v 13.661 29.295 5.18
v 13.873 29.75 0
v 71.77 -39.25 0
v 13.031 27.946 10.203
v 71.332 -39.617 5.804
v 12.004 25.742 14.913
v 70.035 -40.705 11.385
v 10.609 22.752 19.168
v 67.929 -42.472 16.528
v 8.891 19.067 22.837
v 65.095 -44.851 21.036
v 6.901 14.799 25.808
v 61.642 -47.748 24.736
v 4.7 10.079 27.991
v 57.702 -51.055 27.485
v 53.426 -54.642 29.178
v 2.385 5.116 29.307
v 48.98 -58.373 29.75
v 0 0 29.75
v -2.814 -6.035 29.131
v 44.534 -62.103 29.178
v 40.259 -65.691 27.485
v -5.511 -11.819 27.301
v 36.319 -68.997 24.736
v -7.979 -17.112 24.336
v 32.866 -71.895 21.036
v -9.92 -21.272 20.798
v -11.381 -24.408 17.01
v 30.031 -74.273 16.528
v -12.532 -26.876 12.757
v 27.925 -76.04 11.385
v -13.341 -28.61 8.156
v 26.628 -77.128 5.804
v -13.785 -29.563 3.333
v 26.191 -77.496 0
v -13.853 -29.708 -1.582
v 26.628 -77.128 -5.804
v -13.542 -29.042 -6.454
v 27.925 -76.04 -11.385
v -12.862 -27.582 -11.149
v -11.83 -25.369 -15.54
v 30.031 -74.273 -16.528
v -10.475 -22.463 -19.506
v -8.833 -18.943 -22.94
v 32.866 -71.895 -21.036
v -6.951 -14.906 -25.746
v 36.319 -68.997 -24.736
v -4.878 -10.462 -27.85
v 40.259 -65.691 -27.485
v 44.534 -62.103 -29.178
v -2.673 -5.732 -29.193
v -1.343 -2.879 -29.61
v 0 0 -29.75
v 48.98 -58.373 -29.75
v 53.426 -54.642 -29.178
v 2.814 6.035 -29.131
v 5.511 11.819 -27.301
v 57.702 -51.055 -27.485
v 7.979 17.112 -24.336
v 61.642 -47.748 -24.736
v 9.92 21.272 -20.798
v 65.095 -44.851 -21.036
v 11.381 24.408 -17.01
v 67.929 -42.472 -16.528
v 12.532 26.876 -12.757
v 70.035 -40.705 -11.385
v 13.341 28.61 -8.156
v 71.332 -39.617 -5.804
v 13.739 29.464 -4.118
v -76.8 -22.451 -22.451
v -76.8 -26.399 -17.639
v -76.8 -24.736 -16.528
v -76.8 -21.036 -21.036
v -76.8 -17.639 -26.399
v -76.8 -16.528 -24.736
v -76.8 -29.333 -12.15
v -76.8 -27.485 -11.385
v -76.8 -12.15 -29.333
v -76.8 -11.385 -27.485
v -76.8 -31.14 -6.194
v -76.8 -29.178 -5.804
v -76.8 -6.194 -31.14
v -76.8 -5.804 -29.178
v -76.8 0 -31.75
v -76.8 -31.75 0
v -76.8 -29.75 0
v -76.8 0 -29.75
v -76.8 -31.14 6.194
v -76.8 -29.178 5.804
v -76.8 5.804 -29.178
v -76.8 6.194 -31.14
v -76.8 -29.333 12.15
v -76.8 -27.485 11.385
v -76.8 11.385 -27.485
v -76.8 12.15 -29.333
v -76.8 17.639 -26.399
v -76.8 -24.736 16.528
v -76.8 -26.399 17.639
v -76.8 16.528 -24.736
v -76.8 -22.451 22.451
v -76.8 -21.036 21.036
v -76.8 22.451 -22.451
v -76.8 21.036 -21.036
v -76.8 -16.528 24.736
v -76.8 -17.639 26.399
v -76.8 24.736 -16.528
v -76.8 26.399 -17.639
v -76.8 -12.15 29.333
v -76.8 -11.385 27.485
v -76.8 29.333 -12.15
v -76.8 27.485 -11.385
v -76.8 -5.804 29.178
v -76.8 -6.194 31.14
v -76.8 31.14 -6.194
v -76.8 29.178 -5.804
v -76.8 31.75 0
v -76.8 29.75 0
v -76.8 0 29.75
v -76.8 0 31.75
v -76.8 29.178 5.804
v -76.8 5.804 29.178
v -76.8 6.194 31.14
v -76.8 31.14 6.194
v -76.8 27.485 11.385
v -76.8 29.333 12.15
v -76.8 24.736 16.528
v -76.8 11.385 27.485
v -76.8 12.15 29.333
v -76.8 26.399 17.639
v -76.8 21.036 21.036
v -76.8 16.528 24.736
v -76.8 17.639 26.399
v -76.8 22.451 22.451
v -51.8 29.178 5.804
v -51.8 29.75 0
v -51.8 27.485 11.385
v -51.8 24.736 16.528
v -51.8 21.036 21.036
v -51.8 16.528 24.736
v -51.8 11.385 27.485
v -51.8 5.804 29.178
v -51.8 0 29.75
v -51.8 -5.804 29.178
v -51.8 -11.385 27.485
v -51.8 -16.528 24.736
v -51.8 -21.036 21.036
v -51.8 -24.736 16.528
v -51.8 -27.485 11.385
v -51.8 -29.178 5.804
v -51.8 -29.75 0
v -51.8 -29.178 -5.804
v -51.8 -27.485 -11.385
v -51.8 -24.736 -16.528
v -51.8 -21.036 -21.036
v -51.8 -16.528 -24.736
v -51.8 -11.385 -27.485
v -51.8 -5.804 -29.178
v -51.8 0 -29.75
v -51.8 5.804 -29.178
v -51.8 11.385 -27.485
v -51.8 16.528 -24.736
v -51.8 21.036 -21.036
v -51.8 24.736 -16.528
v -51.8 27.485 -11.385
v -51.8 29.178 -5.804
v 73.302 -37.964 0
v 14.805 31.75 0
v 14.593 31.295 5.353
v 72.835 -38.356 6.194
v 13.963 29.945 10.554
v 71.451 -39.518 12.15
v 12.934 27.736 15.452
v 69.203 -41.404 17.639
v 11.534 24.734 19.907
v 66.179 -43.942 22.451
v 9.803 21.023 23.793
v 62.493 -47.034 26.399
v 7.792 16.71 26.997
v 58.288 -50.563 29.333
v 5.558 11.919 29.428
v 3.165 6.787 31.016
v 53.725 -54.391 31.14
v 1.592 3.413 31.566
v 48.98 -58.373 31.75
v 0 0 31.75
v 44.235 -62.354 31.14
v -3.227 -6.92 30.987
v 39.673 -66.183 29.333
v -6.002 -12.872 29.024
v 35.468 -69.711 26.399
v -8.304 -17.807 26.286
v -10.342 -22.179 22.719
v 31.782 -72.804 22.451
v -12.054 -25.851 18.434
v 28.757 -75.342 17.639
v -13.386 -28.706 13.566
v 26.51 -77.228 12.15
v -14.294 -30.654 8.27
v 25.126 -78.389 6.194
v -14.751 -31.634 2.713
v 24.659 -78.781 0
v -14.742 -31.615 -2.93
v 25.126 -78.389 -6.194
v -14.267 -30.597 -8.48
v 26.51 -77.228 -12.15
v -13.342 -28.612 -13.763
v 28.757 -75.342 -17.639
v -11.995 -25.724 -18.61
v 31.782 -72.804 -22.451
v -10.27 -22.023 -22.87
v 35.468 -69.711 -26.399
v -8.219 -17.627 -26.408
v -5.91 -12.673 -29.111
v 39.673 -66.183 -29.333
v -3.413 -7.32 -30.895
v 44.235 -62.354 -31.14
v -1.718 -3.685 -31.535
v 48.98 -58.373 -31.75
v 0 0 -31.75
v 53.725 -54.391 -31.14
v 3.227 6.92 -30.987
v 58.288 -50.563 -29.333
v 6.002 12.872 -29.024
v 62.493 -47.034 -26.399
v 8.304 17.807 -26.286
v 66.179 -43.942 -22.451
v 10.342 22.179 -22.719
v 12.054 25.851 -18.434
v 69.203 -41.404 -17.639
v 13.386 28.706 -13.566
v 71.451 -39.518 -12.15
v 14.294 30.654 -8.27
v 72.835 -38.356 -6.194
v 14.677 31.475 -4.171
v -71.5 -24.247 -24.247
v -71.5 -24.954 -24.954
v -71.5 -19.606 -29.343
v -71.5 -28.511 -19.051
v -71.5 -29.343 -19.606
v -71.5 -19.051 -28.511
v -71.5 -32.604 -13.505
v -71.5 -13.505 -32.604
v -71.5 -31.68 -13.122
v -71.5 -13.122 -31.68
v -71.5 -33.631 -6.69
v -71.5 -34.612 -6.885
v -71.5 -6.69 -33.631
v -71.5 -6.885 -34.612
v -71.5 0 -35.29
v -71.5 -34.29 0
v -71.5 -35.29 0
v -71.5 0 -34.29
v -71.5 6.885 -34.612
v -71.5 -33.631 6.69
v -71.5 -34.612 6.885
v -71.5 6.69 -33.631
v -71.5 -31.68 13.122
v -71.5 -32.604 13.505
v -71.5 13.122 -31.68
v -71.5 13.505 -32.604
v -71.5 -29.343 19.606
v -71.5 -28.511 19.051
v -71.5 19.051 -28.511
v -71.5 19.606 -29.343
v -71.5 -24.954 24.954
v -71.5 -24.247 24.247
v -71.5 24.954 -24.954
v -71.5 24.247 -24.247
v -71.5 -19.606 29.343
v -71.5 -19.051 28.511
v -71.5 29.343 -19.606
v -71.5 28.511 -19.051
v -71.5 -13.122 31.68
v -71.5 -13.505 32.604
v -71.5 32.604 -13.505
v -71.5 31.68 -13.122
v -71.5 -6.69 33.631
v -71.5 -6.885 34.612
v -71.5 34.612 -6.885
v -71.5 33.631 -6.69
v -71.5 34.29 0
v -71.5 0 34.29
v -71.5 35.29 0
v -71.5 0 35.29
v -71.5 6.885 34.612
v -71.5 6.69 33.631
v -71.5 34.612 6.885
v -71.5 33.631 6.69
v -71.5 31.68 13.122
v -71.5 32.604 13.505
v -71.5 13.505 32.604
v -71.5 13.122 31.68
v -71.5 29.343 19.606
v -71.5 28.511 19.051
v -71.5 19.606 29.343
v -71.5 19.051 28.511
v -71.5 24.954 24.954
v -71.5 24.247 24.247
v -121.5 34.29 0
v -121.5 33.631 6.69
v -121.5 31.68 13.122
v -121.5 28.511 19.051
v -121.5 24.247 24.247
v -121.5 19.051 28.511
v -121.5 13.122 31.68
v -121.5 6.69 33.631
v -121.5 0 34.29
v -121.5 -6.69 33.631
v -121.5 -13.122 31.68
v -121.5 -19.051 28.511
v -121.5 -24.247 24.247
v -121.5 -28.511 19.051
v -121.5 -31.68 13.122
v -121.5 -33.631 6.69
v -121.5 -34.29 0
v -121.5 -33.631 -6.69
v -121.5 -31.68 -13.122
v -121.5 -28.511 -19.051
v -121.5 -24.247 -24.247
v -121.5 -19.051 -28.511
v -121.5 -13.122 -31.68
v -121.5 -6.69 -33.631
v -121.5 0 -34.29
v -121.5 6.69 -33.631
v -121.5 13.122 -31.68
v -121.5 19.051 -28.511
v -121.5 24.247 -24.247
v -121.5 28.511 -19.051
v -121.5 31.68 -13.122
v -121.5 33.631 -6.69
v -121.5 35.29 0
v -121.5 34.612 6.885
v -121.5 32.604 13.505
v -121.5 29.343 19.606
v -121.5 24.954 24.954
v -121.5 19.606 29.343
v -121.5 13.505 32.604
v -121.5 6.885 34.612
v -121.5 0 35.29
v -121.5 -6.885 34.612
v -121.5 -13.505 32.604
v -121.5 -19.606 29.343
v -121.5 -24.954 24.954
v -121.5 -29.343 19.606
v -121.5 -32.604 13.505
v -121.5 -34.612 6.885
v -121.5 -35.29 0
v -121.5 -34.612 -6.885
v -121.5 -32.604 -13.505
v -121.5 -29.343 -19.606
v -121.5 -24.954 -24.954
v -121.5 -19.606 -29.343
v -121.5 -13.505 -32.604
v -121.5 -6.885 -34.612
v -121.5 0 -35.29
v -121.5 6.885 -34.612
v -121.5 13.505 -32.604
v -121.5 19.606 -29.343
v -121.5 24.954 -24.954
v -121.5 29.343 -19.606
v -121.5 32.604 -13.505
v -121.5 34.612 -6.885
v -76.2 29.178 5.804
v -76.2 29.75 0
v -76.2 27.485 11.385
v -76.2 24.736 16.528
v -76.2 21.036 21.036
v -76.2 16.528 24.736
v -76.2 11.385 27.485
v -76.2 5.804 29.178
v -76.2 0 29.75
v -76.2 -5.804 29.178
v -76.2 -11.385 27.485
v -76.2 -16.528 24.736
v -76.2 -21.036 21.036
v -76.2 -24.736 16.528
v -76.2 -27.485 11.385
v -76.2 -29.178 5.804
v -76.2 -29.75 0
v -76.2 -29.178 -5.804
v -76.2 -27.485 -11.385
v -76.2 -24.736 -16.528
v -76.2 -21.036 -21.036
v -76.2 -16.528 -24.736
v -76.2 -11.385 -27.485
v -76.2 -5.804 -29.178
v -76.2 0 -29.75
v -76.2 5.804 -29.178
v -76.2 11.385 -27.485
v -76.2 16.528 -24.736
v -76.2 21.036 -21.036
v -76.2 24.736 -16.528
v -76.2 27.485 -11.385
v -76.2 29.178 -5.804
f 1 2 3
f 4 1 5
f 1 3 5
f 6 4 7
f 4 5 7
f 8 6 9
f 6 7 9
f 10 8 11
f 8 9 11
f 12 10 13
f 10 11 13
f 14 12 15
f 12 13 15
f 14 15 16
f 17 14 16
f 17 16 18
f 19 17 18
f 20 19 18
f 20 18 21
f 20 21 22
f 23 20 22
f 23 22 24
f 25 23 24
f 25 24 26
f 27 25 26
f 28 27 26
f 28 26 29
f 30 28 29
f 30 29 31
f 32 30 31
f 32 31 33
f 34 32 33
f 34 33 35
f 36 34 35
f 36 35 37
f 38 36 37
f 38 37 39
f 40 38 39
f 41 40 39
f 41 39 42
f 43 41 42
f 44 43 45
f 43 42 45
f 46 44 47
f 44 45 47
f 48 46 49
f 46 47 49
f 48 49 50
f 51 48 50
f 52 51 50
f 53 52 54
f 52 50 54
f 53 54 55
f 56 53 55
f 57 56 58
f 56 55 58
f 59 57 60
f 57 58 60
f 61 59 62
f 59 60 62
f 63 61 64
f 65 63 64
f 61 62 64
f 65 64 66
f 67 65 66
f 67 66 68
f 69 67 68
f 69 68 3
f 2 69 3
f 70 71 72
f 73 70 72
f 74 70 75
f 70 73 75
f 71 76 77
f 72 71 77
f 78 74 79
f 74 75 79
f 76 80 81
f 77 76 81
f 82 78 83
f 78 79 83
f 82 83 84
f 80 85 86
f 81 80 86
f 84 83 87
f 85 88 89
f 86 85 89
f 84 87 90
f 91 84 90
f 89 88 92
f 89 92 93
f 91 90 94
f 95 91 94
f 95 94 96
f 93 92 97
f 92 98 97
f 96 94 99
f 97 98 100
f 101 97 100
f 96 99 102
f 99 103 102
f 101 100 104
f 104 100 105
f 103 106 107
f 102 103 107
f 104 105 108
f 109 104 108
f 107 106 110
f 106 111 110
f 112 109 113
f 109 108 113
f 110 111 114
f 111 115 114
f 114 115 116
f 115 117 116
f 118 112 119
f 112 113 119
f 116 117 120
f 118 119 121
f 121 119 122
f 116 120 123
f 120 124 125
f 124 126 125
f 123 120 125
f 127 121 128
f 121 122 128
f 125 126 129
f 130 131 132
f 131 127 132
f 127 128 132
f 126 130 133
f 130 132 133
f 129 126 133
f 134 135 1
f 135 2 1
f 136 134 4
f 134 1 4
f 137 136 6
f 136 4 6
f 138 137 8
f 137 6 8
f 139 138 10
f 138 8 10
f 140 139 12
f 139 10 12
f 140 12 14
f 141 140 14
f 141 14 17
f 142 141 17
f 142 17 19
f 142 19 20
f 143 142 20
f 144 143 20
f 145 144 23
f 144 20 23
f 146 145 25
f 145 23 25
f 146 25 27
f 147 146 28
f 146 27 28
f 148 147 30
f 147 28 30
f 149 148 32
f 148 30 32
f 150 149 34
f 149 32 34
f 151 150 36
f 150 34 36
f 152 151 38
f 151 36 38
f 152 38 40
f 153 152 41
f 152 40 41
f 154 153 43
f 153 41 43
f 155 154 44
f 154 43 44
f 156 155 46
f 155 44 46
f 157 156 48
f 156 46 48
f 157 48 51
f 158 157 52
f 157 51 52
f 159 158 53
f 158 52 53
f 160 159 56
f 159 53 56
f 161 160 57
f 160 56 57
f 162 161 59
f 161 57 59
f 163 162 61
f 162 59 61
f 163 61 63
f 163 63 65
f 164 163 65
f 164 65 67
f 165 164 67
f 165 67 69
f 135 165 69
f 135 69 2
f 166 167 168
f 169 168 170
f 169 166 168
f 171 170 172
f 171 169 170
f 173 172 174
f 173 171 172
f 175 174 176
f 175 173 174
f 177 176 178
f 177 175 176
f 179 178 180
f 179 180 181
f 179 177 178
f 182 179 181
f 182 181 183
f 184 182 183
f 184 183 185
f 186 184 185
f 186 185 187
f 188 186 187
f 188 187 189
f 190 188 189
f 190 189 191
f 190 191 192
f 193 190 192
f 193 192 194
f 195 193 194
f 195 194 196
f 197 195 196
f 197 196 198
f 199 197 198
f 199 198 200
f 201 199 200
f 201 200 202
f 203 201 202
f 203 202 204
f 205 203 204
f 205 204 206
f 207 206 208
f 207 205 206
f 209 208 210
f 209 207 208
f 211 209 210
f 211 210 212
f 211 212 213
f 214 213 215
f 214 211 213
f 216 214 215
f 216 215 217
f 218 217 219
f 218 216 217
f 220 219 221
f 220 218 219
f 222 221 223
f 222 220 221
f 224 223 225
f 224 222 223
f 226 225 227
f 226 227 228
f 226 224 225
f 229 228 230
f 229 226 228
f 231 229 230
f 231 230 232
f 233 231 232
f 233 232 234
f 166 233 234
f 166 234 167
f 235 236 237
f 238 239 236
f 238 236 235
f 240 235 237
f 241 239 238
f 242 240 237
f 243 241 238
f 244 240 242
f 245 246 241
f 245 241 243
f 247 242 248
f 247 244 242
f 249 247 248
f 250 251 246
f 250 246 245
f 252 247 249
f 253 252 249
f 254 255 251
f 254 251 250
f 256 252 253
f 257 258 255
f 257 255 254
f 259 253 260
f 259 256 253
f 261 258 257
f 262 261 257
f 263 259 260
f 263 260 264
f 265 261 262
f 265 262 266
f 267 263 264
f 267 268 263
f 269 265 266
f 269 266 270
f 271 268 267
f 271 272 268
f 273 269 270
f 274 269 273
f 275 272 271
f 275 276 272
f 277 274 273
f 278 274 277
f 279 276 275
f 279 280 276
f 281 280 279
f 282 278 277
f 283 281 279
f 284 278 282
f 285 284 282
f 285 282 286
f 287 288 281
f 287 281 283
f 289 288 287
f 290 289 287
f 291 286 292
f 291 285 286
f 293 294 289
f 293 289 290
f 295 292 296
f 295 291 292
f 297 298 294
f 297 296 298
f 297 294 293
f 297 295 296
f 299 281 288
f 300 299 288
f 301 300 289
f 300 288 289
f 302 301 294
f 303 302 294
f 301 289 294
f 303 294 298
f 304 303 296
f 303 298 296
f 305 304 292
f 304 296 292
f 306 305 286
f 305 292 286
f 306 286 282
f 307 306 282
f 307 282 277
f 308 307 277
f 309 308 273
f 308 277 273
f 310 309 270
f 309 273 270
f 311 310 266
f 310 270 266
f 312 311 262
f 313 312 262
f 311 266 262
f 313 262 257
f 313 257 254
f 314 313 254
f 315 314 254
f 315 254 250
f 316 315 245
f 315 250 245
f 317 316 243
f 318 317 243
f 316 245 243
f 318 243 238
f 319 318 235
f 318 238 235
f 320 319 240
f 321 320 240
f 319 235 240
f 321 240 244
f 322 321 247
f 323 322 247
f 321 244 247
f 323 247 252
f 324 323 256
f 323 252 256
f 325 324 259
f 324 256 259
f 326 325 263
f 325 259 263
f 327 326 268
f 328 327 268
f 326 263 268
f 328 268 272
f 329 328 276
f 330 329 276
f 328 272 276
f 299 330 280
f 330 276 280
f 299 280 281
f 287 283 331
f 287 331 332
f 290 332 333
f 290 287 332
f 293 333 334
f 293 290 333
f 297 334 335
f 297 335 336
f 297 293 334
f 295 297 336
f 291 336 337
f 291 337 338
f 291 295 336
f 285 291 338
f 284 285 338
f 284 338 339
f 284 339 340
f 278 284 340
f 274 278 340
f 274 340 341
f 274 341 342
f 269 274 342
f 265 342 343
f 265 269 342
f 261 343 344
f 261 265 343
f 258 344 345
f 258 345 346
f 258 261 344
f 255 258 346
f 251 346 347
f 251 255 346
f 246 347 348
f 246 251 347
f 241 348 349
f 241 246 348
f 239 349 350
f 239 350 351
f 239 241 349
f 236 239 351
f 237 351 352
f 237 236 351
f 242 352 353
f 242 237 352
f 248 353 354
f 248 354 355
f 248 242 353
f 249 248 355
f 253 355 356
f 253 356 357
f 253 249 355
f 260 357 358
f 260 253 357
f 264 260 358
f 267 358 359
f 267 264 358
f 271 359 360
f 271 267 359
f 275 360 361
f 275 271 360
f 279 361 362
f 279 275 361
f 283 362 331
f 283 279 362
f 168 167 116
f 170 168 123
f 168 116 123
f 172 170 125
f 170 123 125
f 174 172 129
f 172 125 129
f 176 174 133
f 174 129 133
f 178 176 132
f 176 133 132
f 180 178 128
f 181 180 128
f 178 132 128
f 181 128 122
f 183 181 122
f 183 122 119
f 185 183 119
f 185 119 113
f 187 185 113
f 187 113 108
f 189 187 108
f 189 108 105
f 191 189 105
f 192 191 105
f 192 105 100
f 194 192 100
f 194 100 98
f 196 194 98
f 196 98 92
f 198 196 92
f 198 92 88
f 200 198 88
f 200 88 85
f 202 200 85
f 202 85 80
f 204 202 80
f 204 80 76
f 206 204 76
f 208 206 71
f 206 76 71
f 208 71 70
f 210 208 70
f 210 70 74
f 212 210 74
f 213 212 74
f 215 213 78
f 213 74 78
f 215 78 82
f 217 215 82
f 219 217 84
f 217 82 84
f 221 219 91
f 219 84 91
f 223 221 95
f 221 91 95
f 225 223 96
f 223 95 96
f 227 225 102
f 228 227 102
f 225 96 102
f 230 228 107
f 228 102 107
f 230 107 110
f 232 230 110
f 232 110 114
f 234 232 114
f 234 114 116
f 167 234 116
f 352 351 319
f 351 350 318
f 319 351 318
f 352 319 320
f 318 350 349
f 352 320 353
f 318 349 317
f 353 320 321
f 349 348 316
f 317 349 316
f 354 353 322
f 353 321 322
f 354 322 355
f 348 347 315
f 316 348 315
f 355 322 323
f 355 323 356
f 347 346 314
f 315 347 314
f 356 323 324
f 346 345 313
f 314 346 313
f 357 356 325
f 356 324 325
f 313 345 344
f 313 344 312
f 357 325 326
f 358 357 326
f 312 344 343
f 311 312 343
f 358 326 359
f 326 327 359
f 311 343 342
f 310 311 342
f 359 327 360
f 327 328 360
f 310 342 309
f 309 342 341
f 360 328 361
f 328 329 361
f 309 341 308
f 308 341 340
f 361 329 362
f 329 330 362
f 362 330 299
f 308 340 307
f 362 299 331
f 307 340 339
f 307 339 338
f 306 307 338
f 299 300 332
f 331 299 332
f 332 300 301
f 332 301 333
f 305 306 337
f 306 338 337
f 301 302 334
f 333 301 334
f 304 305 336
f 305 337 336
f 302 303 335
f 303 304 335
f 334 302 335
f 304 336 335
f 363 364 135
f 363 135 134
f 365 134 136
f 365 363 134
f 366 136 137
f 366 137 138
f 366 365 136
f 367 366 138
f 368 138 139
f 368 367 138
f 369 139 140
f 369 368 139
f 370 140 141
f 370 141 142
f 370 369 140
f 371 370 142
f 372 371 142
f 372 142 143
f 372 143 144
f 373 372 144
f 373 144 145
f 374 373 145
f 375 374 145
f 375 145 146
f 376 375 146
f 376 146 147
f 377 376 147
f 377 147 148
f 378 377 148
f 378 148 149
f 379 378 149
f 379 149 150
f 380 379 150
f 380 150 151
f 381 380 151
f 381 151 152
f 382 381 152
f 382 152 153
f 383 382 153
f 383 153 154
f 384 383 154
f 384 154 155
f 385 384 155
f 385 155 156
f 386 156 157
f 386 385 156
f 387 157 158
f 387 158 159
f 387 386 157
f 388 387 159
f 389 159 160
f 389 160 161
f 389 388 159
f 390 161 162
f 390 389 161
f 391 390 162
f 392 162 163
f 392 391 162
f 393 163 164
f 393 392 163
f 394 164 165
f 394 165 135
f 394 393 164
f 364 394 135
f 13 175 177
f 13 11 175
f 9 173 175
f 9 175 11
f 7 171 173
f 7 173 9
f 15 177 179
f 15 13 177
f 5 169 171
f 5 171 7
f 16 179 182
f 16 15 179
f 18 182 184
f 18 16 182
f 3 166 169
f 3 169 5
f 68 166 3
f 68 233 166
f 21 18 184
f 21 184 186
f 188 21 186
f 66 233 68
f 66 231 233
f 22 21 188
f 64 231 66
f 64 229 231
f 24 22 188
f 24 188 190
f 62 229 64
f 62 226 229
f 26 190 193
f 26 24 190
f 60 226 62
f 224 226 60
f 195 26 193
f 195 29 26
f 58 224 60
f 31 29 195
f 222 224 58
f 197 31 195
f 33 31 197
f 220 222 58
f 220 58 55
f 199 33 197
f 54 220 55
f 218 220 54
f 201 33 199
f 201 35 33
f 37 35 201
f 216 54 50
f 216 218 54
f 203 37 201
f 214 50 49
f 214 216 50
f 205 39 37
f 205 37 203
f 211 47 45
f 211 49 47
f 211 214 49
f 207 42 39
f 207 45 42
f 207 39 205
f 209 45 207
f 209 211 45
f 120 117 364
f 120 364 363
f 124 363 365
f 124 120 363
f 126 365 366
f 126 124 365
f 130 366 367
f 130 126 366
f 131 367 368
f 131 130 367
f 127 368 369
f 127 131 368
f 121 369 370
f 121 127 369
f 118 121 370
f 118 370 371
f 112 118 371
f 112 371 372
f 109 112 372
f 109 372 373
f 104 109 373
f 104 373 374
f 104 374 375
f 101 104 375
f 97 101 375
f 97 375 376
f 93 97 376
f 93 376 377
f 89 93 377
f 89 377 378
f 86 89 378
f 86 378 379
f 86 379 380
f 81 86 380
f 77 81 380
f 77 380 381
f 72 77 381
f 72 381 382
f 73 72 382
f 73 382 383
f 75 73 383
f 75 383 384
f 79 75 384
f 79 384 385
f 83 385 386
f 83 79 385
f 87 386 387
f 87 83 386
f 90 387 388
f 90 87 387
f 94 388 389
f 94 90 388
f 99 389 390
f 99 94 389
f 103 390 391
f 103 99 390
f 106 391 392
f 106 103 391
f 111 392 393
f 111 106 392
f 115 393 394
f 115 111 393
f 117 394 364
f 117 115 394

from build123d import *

# Parameters (mm, degrees)
F2_R        = 31.75
F2_R_2      = 29.7500006855
F3_DEPTH    = 25
F3_FACE_R   = 31.75
F3_FACE_R_2 = 29.7500006855
F6_R        = 35.2899990976
F6_R_2      = 34.29
F7_DEPTH    = 50


with BuildPart() as f3:
    # F2 (on offset) → F3 (new body)
    with BuildSketch(Plane.YZ.offset(-76.8)):
        Circle(F2_R)
        Circle(F2_R_2, mode=Mode.SUBTRACT)
    extrude(amount=F3_DEPTH)

    # F4: sweep along a path in F0
    with BuildLine(Plane.XY) as f4_path:
        Line((-76.2, 0), (0, 0))
        Line((0, 0), (48.9804158581, -58.3725865657))
    # F3_face (on face) → F4 (sweep)
    with BuildSketch(Plane.YZ.offset(-51.8)):
        Circle(F3_FACE_R)
        Circle(F3_FACE_R_2, mode=Mode.SUBTRACT)
    sweep(path=f4_path.line, transition=Transition.RIGHT)


with BuildPart() as f7:
    # F6 (on offset) → F7 (new body)
    with BuildSketch(Plane.YZ.offset(-71.5)):
        Circle(F6_R)
        Circle(F6_R_2, mode=Mode.SUBTRACT)
    extrude(amount=-F7_DEPTH)


solid = Compound([f3.part, f7.part])
